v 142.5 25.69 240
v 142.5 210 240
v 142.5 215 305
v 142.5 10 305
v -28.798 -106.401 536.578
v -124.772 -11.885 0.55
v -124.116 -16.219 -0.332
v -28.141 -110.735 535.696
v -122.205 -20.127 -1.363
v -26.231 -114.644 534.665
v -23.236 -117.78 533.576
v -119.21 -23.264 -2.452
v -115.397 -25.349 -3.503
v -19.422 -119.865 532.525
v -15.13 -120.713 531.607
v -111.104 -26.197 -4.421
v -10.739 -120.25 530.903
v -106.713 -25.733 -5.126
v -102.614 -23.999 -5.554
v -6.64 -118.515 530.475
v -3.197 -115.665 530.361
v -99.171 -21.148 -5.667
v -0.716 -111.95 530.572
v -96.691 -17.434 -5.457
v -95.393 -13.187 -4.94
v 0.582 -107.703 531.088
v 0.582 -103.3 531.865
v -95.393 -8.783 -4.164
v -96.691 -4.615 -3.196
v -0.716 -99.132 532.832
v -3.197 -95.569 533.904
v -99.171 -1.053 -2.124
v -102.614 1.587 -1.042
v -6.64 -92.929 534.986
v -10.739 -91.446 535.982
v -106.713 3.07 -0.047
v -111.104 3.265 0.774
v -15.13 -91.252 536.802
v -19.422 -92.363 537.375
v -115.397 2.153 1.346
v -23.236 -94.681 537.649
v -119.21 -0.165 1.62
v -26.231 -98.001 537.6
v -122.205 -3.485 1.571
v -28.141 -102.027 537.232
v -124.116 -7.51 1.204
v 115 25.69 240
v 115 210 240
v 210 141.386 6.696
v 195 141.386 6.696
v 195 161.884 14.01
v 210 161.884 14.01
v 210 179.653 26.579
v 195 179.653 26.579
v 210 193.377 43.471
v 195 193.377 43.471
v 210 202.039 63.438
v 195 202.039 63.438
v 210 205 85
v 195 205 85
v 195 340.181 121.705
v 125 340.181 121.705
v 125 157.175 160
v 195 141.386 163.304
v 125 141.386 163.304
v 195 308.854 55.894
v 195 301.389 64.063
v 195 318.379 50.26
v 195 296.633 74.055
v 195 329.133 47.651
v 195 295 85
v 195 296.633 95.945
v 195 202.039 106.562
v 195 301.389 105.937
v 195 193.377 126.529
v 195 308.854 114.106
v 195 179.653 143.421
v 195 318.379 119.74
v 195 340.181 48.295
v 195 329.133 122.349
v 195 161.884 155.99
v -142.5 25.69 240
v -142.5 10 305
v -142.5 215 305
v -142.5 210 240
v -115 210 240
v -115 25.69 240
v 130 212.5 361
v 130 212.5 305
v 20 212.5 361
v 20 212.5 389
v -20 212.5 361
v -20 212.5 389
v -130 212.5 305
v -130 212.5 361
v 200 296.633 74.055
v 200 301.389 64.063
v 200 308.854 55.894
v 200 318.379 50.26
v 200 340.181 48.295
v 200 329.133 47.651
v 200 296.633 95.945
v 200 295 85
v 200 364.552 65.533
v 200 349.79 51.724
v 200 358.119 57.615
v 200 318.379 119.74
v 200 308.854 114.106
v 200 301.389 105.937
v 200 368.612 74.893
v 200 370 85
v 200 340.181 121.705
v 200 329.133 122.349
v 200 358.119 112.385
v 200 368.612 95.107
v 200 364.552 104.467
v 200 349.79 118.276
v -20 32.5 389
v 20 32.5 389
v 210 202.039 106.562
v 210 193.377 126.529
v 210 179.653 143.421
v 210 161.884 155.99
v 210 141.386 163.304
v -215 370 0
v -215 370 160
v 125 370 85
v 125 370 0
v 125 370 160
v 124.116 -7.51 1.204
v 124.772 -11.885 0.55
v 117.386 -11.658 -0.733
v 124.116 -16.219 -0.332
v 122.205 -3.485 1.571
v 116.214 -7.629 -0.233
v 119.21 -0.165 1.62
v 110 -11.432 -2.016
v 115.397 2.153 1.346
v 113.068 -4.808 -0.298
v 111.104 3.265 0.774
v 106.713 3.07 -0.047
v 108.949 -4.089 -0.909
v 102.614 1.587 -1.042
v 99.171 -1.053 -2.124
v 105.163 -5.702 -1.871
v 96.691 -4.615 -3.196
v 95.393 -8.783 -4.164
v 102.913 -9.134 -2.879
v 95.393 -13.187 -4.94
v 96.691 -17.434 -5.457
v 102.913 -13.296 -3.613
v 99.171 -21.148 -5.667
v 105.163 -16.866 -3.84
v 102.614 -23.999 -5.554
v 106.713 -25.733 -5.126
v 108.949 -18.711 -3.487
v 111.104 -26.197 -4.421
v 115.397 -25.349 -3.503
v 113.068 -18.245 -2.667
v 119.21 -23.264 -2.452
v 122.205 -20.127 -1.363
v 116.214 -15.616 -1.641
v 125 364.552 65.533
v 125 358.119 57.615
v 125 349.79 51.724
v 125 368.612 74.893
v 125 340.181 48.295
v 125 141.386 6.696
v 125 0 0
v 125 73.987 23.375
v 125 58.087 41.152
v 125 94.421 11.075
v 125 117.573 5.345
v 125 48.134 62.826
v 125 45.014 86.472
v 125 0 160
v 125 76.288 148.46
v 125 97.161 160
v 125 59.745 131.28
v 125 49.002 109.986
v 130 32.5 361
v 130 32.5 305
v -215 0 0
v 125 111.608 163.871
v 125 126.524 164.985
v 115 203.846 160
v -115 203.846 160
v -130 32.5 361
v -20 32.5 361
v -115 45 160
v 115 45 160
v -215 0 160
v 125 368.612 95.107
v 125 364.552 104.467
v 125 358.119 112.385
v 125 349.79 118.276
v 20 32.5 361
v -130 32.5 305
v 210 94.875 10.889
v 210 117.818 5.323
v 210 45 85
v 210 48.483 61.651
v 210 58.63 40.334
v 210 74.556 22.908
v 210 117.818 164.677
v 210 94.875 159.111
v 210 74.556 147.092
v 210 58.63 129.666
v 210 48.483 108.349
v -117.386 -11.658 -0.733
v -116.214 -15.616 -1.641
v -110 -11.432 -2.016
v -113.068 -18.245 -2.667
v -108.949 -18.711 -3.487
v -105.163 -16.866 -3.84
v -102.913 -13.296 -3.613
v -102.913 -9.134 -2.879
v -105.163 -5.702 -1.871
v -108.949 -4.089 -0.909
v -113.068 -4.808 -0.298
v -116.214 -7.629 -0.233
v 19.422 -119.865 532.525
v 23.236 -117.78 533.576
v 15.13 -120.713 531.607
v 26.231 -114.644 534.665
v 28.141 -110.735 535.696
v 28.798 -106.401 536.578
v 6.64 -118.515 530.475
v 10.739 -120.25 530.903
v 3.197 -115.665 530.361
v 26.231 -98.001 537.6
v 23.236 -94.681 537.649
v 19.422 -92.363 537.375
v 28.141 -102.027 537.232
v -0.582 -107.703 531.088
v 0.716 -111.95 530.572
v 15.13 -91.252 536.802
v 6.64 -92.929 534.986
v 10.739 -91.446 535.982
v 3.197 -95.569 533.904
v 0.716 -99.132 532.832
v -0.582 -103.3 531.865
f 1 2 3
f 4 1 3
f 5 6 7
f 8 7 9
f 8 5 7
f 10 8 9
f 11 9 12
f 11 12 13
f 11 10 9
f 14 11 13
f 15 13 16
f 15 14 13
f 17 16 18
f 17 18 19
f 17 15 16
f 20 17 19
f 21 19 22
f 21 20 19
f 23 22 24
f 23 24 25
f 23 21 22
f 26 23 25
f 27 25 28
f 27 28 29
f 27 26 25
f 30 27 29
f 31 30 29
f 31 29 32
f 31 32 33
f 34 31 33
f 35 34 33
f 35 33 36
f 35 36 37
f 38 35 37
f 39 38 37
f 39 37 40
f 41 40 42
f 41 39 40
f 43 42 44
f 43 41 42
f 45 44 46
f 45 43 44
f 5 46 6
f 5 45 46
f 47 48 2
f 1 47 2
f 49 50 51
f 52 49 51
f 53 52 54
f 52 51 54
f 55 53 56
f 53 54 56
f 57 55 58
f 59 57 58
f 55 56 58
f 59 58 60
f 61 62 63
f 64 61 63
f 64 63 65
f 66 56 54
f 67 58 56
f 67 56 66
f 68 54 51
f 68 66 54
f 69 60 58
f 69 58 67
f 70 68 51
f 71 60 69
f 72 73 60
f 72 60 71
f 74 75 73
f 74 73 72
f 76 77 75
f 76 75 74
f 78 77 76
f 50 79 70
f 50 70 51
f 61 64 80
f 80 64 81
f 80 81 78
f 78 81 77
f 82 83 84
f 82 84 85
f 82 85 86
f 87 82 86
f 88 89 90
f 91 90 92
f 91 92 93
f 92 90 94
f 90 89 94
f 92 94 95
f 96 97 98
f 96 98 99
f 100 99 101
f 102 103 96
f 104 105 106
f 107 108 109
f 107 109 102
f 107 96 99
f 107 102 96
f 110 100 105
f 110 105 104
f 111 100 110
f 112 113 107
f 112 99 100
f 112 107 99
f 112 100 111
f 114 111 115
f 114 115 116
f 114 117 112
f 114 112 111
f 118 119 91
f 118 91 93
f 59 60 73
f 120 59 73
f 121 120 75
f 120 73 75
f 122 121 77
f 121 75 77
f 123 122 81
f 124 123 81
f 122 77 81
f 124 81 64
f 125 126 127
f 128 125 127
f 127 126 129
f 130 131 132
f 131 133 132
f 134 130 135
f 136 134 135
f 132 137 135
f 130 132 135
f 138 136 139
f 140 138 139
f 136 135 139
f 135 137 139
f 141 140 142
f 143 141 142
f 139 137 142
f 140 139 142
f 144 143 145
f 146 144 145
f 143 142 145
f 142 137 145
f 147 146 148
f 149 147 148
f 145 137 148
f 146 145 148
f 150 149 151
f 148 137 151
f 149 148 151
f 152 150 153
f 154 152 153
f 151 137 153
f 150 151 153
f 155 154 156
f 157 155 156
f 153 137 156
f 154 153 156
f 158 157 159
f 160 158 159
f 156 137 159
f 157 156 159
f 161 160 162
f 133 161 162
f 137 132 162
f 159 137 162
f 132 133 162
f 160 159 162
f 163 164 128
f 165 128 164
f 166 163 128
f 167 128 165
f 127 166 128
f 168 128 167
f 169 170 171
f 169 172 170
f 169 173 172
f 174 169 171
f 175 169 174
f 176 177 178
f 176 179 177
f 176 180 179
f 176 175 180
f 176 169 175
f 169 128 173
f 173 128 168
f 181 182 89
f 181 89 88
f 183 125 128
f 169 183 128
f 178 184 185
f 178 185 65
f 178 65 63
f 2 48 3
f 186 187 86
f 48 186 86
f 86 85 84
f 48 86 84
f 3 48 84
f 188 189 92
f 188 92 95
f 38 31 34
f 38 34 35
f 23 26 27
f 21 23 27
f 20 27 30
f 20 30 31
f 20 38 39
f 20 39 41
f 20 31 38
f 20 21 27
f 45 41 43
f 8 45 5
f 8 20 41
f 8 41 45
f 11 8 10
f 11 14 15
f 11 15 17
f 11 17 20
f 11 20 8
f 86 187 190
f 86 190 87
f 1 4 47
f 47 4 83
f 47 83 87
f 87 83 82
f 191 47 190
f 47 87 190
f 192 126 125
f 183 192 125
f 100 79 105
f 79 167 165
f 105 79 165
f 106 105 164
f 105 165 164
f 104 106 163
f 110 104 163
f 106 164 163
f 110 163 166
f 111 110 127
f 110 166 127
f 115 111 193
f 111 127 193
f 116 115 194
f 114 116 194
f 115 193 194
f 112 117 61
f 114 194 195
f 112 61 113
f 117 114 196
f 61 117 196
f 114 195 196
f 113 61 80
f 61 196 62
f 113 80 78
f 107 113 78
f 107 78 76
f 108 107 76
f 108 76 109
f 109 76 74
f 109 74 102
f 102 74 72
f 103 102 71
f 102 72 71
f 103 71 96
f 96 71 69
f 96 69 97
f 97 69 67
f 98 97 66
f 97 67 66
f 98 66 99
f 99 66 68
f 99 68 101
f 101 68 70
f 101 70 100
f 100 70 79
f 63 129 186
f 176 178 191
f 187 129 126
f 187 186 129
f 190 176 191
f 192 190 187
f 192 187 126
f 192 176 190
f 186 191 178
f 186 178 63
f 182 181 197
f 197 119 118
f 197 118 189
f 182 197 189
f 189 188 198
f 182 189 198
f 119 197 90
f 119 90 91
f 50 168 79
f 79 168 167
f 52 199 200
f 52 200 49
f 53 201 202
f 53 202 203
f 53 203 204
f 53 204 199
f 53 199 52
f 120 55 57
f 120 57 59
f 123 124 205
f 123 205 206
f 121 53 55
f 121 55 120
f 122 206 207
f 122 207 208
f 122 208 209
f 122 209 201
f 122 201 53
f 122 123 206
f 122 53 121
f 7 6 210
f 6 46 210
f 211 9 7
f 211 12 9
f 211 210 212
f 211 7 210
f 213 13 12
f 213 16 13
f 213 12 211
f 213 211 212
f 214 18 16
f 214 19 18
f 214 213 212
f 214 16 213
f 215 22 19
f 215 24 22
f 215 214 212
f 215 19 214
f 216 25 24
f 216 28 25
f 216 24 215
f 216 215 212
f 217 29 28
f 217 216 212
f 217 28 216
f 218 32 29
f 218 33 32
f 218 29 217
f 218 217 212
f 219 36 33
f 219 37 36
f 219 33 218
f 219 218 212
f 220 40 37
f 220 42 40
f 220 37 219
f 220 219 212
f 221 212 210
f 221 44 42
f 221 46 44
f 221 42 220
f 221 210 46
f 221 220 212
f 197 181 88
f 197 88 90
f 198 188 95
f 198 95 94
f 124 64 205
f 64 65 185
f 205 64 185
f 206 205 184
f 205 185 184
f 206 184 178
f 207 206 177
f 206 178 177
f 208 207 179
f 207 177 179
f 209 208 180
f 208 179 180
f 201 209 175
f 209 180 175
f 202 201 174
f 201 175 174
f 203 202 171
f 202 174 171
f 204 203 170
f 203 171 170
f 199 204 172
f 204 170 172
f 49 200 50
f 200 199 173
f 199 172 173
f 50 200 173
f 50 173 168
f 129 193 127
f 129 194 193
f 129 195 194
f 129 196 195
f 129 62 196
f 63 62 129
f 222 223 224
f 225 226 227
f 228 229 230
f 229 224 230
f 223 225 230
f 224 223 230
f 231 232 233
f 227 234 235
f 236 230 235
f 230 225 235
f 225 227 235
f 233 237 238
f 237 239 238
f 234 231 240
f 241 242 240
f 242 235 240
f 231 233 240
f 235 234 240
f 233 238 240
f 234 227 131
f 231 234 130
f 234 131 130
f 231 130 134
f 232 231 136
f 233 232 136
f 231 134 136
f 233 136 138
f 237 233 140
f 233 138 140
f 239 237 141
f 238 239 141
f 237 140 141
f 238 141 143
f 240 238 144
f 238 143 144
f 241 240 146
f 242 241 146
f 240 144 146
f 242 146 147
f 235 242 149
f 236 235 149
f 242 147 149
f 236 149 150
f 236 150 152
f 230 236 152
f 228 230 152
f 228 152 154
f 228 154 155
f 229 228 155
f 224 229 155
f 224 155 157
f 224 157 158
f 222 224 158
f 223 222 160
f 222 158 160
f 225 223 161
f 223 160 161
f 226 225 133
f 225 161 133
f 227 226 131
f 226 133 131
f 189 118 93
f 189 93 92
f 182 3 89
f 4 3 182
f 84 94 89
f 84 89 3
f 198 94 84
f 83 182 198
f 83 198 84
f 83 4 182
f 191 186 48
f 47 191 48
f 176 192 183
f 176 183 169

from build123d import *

# Parameters (mm, degrees)
F0_W      = 10
F0_H      = 160
F0_W_2    = 230
F0_H_2    = 80
F1_DEPTH  = 370
F3_DEPTH  = 357.501
F10_DEPTH = 70
F12_DEPTH = 15
F13_DEPTH = 5


with BuildPart() as f1:
    # F0 (on Front) → F1 (new body)
    with BuildSketch(Plane.XZ):
        Polygon((-215, 160), (-215, 0), (115, 0), (115, 160), (-115, 160), align=None)
        with Locations((120, 80)):
            Rectangle(F0_W, F0_H)
        with Locations((0, 200)):
            Rectangle(F0_W_2, F0_H_2)
        Polygon((-115, 240), (115, 240), (142.5, 240), (142.5, 305), (130, 305), (-130, 305), (-142.5, 305), (-142.5, 240), align=None)
        Polygon((-130, 305), (130, 305), (130, 361), (20, 361), (20, 389), (-20, 389), (-20, 361), (-130, 361), align=None)
    extrude(amount=-F1_DEPTH)

    # F2 (on face) → F3 (cut, through all)
    with BuildSketch(Plane(origin=(-215, 0, 0), x_dir=(0, -1, 0), z_dir=(-1, 0, 0))):
        Polygon((-405.7104587555, 160), (-370, 160), (-203.8461538462, 160), (-210, 240), (-215, 305), (-212.5, 305), (-212.5, 390), (-405.7104587555, 390), align=None)
        Polygon((-25.6896551724, 240), (-45, 160), (0, 160), (90.0000333786, 160), (90.0000333786, 390), (-32.5, 390), (-32.5, 305), (-10, 305), align=None)
    extrude(amount=-F3_DEPTH, mode=Mode.SUBTRACT)

    # F9 (on face) → F10 (join)
    with BuildSketch(Plane.YZ.offset(125)):
        with BuildLine():
            Line((152.8388218141, 160), (97.1611781859, 160))
            ThreePointArc((97.1611781859, 160), (48.1343878644, 62.826194034), (141.3855421687, 6.696015377))
            ThreePointArc((141.3855421687, 6.696015377), (187.0920420565, 34.5561865711), (205, 85))
            ThreePointArc((205, 85), (190.6776436283, 130.6776436283), (152.8388218141, 160))
        make_face()
        with BuildLine():
            Line((157.1747762661, 160), (152.8388218141, 160))
            ThreePointArc((152.8388218141, 160), (190.6776436283, 130.6776436283), (205, 85))
            ThreePointArc((205, 85), (187.0920420565, 34.5561865711), (141.3855421687, 6.696015377))
            Line((141.3855421687, 6.696015377), (340.1807228916, 48.295007208))
            ThreePointArc((340.1807228916, 48.295007208), (295, 85), (340.1807228916, 121.704992792))
            Line((340.1807228916, 121.704992792), (157.1747762661, 160))
        make_face()
        with BuildLine():
            ThreePointArc((340.1807228916, 48.295007208), (361.605644714, 61.3544624552), (370, 85))
            ThreePointArc((370, 85), (361.605644714, 108.6455375448), (340.1807228916, 121.704992792))
            ThreePointArc((340.1807228916, 121.704992792), (295, 85), (340.1807228916, 48.295007208))
        make_face()
        with BuildLine():
            ThreePointArc((141.3855421687, 163.303984623), (119.0398420947, 164.7776692925), (97.1611781859, 160))
            Line((97.1611781859, 160), (152.8388218141, 160))
            ThreePointArc((152.8388218141, 160), (147.173805966, 161.8656121356), (141.3855421687, 163.303984623))
        make_face()
        with BuildLine():
            ThreePointArc((141.3855421687, 163.303984623), (147.173805966, 161.8656121356), (152.8388218141, 160))
            Line((152.8388218141, 160), (157.1747762661, 160))
            Line((157.1747762661, 160), (141.3855421687, 163.303984623))
        make_face()
    extrude(amount=F10_DEPTH)

    # F11 (on face) → F12 (join)
    with BuildSketch(Plane.YZ.offset(195)):
        with BuildLine():
            ThreePointArc((141.3855421687, 6.696015377), (187.0920420565, 34.5561865711), (205, 85))
            ThreePointArc((205, 85), (187.0920420565, 135.4438134289), (141.3855421687, 163.303984623))
            ThreePointArc((141.3855421687, 163.303984623), (45, 85), (141.3855421687, 6.696015377))
        make_face()
    extrude(amount=F12_DEPTH)

    # F11 (on face) → F13 (join)
    with BuildSketch(Plane.YZ.offset(195)):
        with BuildLine():
            ThreePointArc((370, 85), (361.605644714, 108.6455375448), (340.1807228916, 121.704992792))
            ThreePointArc((340.1807228916, 121.704992792), (295, 85), (340.1807228916, 48.295007208))
            ThreePointArc((340.1807228916, 48.295007208), (361.605644714, 61.3544624552), (370, 85))
        make_face()
    extrude(amount=F13_DEPTH)


with BuildPart() as f7:
    # F6 (on line) → F7 (revolve)
    with BuildSketch(Plane(origin=(0, -11.4322409497, -2.0158125294), x_dir=(-1, 0, 0), z_dir=(0, 0.984807753, 0.1736481777))):
        Polygon((-124.7720400912, 2.605154839), (-110, 0), (-56.2202708839, 305), (-14.0256089805, 544.2978189377), (-28.7977252757, 546.9025416027), (-70.9919709792, 307.6070830518), align=None)
    revolve(axis=Axis((83.110135442, -37.9135880439, 148.167369805), (-0.1736481777, -0.1710100717, 0.9698463104)))


with BuildPart() as f8:
    # F6 (on line) → F8 (revolve)
    with BuildSketch(Plane(origin=(0, -11.4322409497, -2.0158125294), x_dir=(-1, 0, 0), z_dir=(0, 0.984807753, 0.1736481777))):
        Polygon((28.7977252757, 546.9025416027), (14.0256089805, 544.2978189377), (56.2202708839, 305), (110, 0), (124.7720400912, 2.605154839), (70.9919709792, 307.6070830518), align=None)
    revolve(axis=Axis((-28.110135442, -92.0780144595, 455.3490966062), (0.1736481777, -0.1710100717, 0.9698463104)))


solid = Compound([f1.part, f7.part, f8.part])
